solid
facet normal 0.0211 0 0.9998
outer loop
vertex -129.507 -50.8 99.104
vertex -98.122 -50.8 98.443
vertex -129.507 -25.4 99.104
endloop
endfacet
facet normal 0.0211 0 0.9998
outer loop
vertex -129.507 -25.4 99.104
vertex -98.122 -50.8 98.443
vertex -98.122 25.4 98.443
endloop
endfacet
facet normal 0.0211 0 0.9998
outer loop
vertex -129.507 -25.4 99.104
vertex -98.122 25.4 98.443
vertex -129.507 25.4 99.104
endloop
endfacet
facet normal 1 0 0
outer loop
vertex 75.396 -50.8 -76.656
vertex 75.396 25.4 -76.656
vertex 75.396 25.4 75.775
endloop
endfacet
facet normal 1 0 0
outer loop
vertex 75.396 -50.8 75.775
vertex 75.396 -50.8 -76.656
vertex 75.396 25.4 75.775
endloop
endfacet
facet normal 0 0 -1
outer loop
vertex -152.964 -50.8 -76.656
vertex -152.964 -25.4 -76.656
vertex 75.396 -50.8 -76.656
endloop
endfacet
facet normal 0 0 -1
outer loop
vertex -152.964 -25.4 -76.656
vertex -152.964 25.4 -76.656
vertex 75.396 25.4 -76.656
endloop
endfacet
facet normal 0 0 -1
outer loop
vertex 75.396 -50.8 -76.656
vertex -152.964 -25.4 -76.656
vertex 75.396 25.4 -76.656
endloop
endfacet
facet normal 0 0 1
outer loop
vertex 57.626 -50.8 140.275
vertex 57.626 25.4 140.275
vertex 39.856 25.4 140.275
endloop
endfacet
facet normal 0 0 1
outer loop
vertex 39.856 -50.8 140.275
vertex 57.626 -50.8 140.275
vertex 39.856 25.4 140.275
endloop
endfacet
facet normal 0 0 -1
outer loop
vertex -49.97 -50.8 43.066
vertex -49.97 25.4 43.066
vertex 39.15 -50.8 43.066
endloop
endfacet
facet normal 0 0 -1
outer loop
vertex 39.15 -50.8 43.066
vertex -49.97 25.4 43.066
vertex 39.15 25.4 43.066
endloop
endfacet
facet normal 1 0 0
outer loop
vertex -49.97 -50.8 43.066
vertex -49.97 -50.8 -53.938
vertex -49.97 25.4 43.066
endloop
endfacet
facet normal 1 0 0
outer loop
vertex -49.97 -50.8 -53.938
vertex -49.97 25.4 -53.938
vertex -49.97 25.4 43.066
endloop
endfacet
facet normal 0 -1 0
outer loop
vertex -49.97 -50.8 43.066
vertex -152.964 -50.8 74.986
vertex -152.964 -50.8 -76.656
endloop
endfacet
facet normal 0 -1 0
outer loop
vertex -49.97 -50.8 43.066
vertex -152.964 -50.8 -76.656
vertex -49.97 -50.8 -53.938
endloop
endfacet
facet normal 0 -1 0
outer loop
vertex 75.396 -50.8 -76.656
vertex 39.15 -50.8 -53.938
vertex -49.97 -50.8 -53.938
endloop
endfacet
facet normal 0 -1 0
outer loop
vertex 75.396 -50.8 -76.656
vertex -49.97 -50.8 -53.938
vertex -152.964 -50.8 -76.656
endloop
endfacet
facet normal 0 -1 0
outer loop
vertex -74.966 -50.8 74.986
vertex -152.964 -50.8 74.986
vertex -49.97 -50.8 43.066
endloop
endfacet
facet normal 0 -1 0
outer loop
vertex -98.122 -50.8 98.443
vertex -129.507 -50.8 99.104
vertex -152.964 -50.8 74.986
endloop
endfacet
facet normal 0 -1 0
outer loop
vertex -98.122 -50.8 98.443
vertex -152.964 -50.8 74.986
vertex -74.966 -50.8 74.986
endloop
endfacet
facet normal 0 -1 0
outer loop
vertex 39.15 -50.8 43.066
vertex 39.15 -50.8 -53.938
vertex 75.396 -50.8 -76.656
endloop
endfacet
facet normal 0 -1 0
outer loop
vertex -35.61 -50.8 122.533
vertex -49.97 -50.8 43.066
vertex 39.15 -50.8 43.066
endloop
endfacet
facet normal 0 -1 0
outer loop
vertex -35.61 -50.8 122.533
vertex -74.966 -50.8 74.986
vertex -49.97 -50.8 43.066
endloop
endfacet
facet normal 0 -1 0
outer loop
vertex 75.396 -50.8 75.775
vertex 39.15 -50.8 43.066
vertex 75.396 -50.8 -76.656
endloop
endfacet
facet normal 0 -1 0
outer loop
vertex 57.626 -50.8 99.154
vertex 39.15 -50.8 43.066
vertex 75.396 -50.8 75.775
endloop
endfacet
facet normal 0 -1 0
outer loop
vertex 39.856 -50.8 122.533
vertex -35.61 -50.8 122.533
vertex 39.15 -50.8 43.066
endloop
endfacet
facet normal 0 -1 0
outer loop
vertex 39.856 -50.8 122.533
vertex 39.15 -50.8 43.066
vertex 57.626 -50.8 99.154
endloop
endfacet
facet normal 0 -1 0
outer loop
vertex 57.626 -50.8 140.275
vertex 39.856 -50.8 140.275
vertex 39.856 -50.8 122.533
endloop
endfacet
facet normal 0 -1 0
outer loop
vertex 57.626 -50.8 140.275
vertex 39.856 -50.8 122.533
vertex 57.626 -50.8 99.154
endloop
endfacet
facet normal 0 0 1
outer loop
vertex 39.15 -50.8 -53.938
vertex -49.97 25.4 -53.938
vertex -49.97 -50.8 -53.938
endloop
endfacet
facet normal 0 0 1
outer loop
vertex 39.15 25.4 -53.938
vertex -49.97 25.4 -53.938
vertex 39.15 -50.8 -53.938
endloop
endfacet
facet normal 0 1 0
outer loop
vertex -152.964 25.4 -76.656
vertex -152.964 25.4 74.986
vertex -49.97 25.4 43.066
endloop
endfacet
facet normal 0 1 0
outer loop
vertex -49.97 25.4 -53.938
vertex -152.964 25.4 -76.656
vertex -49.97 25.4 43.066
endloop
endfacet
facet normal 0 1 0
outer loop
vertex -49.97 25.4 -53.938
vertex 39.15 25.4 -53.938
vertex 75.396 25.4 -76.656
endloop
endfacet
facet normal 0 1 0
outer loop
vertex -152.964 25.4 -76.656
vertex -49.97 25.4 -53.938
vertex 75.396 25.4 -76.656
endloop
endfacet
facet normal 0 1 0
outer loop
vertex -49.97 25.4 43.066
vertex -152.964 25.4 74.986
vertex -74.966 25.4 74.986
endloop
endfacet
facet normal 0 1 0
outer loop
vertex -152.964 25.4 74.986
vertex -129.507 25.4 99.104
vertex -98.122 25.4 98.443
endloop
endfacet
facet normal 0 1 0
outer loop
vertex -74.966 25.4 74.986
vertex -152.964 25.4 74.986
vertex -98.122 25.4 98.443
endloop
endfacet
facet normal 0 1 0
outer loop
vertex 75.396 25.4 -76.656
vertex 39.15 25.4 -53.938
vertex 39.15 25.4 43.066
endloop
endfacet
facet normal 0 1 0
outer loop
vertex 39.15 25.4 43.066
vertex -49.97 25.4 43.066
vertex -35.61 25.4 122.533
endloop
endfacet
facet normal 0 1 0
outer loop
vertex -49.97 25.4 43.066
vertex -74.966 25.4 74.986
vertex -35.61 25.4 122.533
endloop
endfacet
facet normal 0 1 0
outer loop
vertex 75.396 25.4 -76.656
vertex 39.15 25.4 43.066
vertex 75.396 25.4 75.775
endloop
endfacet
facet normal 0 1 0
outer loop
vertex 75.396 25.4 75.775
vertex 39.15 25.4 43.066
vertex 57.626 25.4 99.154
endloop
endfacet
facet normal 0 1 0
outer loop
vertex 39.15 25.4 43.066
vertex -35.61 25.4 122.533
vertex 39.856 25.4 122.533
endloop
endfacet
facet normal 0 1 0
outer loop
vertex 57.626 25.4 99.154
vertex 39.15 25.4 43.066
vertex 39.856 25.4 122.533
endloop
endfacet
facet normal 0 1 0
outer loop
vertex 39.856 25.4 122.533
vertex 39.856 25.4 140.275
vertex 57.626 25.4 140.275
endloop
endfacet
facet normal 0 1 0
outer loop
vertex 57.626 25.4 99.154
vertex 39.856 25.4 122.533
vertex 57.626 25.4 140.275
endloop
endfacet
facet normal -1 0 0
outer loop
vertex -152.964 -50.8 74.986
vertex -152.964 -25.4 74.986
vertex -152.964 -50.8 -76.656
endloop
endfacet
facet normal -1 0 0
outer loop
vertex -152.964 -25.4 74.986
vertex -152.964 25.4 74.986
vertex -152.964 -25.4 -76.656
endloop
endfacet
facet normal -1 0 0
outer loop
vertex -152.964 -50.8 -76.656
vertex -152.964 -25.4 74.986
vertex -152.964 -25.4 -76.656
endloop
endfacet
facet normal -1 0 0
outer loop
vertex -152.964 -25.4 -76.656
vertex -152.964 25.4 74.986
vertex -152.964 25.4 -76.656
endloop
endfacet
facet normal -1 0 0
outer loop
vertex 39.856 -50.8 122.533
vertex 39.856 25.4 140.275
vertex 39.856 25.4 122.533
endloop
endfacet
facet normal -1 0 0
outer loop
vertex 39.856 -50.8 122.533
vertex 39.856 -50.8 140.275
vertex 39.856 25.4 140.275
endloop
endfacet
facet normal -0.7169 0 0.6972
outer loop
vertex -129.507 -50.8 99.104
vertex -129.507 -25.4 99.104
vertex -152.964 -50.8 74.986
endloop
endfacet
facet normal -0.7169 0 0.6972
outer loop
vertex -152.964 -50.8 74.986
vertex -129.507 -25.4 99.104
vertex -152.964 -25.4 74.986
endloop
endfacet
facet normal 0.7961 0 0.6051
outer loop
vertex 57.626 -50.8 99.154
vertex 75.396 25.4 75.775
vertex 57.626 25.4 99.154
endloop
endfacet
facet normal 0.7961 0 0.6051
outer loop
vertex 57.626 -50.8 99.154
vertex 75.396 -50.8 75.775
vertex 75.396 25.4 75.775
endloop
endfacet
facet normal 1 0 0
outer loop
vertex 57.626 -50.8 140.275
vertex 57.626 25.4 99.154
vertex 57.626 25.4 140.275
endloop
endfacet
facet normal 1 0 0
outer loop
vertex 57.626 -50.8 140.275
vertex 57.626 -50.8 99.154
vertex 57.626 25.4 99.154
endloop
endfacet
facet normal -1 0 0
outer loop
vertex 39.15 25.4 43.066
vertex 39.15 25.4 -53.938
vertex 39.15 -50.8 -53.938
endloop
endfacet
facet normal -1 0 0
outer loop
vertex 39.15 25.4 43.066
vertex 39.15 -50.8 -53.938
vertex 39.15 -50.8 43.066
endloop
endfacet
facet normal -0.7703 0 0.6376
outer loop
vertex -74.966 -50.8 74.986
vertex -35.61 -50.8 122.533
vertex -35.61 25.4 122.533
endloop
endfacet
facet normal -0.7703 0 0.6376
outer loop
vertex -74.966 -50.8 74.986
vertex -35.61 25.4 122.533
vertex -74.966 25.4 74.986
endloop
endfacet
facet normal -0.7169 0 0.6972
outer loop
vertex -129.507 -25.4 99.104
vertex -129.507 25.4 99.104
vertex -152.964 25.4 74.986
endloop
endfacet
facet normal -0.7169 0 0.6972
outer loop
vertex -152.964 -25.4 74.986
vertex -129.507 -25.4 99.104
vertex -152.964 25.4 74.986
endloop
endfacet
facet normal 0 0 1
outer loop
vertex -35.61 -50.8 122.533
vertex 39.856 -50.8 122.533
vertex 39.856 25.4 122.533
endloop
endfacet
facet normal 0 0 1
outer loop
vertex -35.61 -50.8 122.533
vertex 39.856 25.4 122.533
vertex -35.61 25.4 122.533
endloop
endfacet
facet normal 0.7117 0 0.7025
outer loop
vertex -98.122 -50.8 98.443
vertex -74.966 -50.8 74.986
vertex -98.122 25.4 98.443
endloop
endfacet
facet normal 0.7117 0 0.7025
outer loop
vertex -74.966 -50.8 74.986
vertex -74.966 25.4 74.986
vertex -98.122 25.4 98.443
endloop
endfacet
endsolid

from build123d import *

# Parameters (mm, degrees)
F0_W      = 89.1198969167
F0_H      = 97.0041044056
F0_W_2    = 77.9982568039
F0_H_2    = 151.6424641013
F1_DEPTH  = 25.4
F2_DEPTH  = 25.4
F3_DEPTH  = 25.4
F4_DEPTH  = 25.4
F1_FACE_W = 89.1198969167
F1_FACE_H = 97.0041044056
F3_FACE_W = 89.1198969167
F3_FACE_H = 97.0041044056
F5_DEPTH  = 25.4


with BuildPart() as f1:
    # F0 (on Front) → F1 (new body)
    with BuildSketch(Plane.XZ):
        Polygon((-35.6096097335, 122.5330978632), (-74.9657242284, 74.9862343073), (75.3956741586, 75.7750719786), (57.6258252308, 99.1540849209), (39.8559763029, 122.5330978632), align=None)
        Polygon((75.3956741586, 75.7750719786), (-74.9657242284, 74.9862343073), (-74.9657242284, -76.656229794), (75.3956741586, -76.656229794), align=None)
        with Locations((-5.4095645109, -5.4363291711)):
            Rectangle(F0_W, F0_H, mode=Mode.SUBTRACT)
        with Locations((-113.9648526304, -0.8349977434)):
            Rectangle(F0_W_2, F0_H_2)
        Polygon((-152.9639810324, 74.9862343073), (-74.9657242284, 74.9862343073), (-98.1215983629, 98.4429121017), (-129.5073032379, 99.103666842), align=None)
        Polygon((39.8559763029, 140.2747780085), (39.8559763029, 122.5330978632), (57.6258252308, 99.1540849209), (57.6258252308, 140.2747780085), align=None)
    extrude(amount=F1_DEPTH)

    # F0 (on Front) → F2 (join)
    with BuildSketch(Plane.XZ):
        Polygon((-35.6096097335, 122.5330978632), (-74.9657242284, 74.9862343073), (75.3956741586, 75.7750719786), (57.6258252308, 99.1540849209), (39.8559763029, 122.5330978632), align=None)
        Polygon((75.3956741586, 75.7750719786), (-74.9657242284, 74.9862343073), (-74.9657242284, -76.656229794), (75.3956741586, -76.656229794), align=None)
        with Locations((-5.4095645109, -5.4363291711)):
            Rectangle(F0_W, F0_H, mode=Mode.SUBTRACT)
        with Locations((-113.9648526304, -0.8349977434)):
            Rectangle(F0_W_2, F0_H_2)
        Polygon((-152.9639810324, 74.9862343073), (-74.9657242284, 74.9862343073), (-98.1215983629, 98.4429121017), (-129.5073032379, 99.103666842), align=None)
        Polygon((39.8559763029, 140.2747780085), (39.8559763029, 122.5330978632), (57.6258252308, 99.1540849209), (57.6258252308, 140.2747780085), align=None)
    extrude(amount=F2_DEPTH)

    # F0 (on Front) → F3 (join)
    with BuildSketch(Plane.XZ):
        Polygon((-35.6096097335, 122.5330978632), (-74.9657242284, 74.9862343073), (75.3956741586, 75.7750719786), (57.6258252308, 99.1540849209), (39.8559763029, 122.5330978632), align=None)
        Polygon((75.3956741586, 75.7750719786), (-74.9657242284, 74.9862343073), (-74.9657242284, -76.656229794), (75.3956741586, -76.656229794), align=None)
        with Locations((-5.4095645109, -5.4363291711)):
            Rectangle(F0_W, F0_H, mode=Mode.SUBTRACT)
        with Locations((-113.9648526304, -0.8349977434)):
            Rectangle(F0_W_2, F0_H_2)
        Polygon((-152.9639810324, 74.9862343073), (-74.9657242284, 74.9862343073), (-98.1215983629, 98.4429121017), (-129.5073032379, 99.103666842), align=None)
        Polygon((39.8559763029, 140.2747780085), (39.8559763029, 122.5330978632), (57.6258252308, 99.1540849209), (57.6258252308, 140.2747780085), align=None)
    extrude(amount=-F3_DEPTH)

    # F0 (on Front) → F4 (join)
    with BuildSketch(Plane.XZ):
        Polygon((-35.6096097335, 122.5330978632), (-74.9657242284, 74.9862343073), (75.3956741586, 75.7750719786), (57.6258252308, 99.1540849209), (39.8559763029, 122.5330978632), align=None)
        Polygon((75.3956741586, 75.7750719786), (-74.9657242284, 74.9862343073), (-74.9657242284, -76.656229794), (75.3956741586, -76.656229794), align=None)
        with Locations((-5.4095645109, -5.4363291711)):
            Rectangle(F0_W, F0_H, mode=Mode.SUBTRACT)
        with Locations((-113.9648526304, -0.8349977434)):
            Rectangle(F0_W_2, F0_H_2)
        Polygon((-152.9639810324, 74.9862343073), (-74.9657242284, 74.9862343073), (-98.1215983629, 98.4429121017), (-129.5073032379, 99.103666842), align=None)
        Polygon((39.8559763029, 140.2747780085), (39.8559763029, 122.5330978632), (57.6258252308, 99.1540849209), (57.6258252308, 140.2747780085), align=None)
    extrude(amount=-F4_DEPTH)

    # F0 (on Front) + F1_face (on face) + F3_face (on face) → F5 (join)
    with BuildSketch(Plane.XZ):
        Polygon((39.8559763029, 140.2747780085), (39.8559763029, 122.5330978632), (57.6258252308, 99.1540849209), (57.6258252308, 140.2747780085), align=None)
        Polygon((-152.9639810324, 74.9862343073), (-74.9657242284, 74.9862343073), (-98.1215983629, 98.4429121017), (-129.5073032379, 99.103666842), align=None)
        Polygon((-35.6096097335, 122.5330978632), (-74.9657242284, 74.9862343073), (75.3956741586, 75.7750719786), (57.6258252308, 99.1540849209), (39.8559763029, 122.5330978632), align=None)
        with Locations((-113.9648526304, -0.8349977434)):
            Rectangle(F0_W_2, F0_H_2)
        Polygon((75.3956741586, 75.7750719786), (-74.9657242284, 74.9862343073), (-74.9657242284, -76.656229794), (75.3956741586, -76.656229794), align=None)
        with Locations((-5.4095645109, -5.4363291711)):
            Rectangle(F0_W, F0_H, mode=Mode.SUBTRACT)
    with BuildSketch(Plane(origin=(-42.5421584691, -25.4, 21.4383649256), x_dir=(1, 0, 0), z_dir=(0, -1, 0))):
        Polygon((117.9378326277, 54.336707053), (100.1679836999, 77.7157199953), (100.1679836999, 118.8364130829), (82.398134772, 118.8364130829), (82.398134772, 101.0947329376), (6.9325487356, 101.0947329376), (-32.4235657593, 53.5478693817), (-55.5794398938, 77.0045471761), (-86.9651447688, 77.6653019164), (-110.4218225632, 53.5478693817), (-110.4218225632, -98.0945947196), (117.9378326277, -98.0945947196), align=None)
        with Locations((37.1325939582, -26.8746940967)):
            Rectangle(F1_FACE_W, F1_FACE_H, mode=Mode.SUBTRACT)
    with BuildSketch(Plane(origin=(-42.5421584691, 25.4, 21.4383649256), x_dir=(1, 0, 0), z_dir=(0, 1, 0))):
        Polygon((100.1679836999, -77.7157199953), (117.9378326277, -54.336707053), (117.9378326277, 98.0945947196), (-110.4218225632, 98.0945947196), (-110.4218225632, -53.5478693817), (-86.9651447688, -77.6653019164), (-55.5794398938, -77.0045471761), (-32.4235657593, -53.5478693817), (6.9325487356, -101.0947329376), (82.398134772, -101.0947329376), (82.398134772, -118.8364130829), (100.1679836999, -118.8364130829), align=None)
        with Locations((37.1325939582, 26.8746940967)):
            Rectangle(F3_FACE_W, F3_FACE_H, mode=Mode.SUBTRACT)
    extrude(amount=F5_DEPTH, dir=(0, -1, 0))


solid = f1.part
